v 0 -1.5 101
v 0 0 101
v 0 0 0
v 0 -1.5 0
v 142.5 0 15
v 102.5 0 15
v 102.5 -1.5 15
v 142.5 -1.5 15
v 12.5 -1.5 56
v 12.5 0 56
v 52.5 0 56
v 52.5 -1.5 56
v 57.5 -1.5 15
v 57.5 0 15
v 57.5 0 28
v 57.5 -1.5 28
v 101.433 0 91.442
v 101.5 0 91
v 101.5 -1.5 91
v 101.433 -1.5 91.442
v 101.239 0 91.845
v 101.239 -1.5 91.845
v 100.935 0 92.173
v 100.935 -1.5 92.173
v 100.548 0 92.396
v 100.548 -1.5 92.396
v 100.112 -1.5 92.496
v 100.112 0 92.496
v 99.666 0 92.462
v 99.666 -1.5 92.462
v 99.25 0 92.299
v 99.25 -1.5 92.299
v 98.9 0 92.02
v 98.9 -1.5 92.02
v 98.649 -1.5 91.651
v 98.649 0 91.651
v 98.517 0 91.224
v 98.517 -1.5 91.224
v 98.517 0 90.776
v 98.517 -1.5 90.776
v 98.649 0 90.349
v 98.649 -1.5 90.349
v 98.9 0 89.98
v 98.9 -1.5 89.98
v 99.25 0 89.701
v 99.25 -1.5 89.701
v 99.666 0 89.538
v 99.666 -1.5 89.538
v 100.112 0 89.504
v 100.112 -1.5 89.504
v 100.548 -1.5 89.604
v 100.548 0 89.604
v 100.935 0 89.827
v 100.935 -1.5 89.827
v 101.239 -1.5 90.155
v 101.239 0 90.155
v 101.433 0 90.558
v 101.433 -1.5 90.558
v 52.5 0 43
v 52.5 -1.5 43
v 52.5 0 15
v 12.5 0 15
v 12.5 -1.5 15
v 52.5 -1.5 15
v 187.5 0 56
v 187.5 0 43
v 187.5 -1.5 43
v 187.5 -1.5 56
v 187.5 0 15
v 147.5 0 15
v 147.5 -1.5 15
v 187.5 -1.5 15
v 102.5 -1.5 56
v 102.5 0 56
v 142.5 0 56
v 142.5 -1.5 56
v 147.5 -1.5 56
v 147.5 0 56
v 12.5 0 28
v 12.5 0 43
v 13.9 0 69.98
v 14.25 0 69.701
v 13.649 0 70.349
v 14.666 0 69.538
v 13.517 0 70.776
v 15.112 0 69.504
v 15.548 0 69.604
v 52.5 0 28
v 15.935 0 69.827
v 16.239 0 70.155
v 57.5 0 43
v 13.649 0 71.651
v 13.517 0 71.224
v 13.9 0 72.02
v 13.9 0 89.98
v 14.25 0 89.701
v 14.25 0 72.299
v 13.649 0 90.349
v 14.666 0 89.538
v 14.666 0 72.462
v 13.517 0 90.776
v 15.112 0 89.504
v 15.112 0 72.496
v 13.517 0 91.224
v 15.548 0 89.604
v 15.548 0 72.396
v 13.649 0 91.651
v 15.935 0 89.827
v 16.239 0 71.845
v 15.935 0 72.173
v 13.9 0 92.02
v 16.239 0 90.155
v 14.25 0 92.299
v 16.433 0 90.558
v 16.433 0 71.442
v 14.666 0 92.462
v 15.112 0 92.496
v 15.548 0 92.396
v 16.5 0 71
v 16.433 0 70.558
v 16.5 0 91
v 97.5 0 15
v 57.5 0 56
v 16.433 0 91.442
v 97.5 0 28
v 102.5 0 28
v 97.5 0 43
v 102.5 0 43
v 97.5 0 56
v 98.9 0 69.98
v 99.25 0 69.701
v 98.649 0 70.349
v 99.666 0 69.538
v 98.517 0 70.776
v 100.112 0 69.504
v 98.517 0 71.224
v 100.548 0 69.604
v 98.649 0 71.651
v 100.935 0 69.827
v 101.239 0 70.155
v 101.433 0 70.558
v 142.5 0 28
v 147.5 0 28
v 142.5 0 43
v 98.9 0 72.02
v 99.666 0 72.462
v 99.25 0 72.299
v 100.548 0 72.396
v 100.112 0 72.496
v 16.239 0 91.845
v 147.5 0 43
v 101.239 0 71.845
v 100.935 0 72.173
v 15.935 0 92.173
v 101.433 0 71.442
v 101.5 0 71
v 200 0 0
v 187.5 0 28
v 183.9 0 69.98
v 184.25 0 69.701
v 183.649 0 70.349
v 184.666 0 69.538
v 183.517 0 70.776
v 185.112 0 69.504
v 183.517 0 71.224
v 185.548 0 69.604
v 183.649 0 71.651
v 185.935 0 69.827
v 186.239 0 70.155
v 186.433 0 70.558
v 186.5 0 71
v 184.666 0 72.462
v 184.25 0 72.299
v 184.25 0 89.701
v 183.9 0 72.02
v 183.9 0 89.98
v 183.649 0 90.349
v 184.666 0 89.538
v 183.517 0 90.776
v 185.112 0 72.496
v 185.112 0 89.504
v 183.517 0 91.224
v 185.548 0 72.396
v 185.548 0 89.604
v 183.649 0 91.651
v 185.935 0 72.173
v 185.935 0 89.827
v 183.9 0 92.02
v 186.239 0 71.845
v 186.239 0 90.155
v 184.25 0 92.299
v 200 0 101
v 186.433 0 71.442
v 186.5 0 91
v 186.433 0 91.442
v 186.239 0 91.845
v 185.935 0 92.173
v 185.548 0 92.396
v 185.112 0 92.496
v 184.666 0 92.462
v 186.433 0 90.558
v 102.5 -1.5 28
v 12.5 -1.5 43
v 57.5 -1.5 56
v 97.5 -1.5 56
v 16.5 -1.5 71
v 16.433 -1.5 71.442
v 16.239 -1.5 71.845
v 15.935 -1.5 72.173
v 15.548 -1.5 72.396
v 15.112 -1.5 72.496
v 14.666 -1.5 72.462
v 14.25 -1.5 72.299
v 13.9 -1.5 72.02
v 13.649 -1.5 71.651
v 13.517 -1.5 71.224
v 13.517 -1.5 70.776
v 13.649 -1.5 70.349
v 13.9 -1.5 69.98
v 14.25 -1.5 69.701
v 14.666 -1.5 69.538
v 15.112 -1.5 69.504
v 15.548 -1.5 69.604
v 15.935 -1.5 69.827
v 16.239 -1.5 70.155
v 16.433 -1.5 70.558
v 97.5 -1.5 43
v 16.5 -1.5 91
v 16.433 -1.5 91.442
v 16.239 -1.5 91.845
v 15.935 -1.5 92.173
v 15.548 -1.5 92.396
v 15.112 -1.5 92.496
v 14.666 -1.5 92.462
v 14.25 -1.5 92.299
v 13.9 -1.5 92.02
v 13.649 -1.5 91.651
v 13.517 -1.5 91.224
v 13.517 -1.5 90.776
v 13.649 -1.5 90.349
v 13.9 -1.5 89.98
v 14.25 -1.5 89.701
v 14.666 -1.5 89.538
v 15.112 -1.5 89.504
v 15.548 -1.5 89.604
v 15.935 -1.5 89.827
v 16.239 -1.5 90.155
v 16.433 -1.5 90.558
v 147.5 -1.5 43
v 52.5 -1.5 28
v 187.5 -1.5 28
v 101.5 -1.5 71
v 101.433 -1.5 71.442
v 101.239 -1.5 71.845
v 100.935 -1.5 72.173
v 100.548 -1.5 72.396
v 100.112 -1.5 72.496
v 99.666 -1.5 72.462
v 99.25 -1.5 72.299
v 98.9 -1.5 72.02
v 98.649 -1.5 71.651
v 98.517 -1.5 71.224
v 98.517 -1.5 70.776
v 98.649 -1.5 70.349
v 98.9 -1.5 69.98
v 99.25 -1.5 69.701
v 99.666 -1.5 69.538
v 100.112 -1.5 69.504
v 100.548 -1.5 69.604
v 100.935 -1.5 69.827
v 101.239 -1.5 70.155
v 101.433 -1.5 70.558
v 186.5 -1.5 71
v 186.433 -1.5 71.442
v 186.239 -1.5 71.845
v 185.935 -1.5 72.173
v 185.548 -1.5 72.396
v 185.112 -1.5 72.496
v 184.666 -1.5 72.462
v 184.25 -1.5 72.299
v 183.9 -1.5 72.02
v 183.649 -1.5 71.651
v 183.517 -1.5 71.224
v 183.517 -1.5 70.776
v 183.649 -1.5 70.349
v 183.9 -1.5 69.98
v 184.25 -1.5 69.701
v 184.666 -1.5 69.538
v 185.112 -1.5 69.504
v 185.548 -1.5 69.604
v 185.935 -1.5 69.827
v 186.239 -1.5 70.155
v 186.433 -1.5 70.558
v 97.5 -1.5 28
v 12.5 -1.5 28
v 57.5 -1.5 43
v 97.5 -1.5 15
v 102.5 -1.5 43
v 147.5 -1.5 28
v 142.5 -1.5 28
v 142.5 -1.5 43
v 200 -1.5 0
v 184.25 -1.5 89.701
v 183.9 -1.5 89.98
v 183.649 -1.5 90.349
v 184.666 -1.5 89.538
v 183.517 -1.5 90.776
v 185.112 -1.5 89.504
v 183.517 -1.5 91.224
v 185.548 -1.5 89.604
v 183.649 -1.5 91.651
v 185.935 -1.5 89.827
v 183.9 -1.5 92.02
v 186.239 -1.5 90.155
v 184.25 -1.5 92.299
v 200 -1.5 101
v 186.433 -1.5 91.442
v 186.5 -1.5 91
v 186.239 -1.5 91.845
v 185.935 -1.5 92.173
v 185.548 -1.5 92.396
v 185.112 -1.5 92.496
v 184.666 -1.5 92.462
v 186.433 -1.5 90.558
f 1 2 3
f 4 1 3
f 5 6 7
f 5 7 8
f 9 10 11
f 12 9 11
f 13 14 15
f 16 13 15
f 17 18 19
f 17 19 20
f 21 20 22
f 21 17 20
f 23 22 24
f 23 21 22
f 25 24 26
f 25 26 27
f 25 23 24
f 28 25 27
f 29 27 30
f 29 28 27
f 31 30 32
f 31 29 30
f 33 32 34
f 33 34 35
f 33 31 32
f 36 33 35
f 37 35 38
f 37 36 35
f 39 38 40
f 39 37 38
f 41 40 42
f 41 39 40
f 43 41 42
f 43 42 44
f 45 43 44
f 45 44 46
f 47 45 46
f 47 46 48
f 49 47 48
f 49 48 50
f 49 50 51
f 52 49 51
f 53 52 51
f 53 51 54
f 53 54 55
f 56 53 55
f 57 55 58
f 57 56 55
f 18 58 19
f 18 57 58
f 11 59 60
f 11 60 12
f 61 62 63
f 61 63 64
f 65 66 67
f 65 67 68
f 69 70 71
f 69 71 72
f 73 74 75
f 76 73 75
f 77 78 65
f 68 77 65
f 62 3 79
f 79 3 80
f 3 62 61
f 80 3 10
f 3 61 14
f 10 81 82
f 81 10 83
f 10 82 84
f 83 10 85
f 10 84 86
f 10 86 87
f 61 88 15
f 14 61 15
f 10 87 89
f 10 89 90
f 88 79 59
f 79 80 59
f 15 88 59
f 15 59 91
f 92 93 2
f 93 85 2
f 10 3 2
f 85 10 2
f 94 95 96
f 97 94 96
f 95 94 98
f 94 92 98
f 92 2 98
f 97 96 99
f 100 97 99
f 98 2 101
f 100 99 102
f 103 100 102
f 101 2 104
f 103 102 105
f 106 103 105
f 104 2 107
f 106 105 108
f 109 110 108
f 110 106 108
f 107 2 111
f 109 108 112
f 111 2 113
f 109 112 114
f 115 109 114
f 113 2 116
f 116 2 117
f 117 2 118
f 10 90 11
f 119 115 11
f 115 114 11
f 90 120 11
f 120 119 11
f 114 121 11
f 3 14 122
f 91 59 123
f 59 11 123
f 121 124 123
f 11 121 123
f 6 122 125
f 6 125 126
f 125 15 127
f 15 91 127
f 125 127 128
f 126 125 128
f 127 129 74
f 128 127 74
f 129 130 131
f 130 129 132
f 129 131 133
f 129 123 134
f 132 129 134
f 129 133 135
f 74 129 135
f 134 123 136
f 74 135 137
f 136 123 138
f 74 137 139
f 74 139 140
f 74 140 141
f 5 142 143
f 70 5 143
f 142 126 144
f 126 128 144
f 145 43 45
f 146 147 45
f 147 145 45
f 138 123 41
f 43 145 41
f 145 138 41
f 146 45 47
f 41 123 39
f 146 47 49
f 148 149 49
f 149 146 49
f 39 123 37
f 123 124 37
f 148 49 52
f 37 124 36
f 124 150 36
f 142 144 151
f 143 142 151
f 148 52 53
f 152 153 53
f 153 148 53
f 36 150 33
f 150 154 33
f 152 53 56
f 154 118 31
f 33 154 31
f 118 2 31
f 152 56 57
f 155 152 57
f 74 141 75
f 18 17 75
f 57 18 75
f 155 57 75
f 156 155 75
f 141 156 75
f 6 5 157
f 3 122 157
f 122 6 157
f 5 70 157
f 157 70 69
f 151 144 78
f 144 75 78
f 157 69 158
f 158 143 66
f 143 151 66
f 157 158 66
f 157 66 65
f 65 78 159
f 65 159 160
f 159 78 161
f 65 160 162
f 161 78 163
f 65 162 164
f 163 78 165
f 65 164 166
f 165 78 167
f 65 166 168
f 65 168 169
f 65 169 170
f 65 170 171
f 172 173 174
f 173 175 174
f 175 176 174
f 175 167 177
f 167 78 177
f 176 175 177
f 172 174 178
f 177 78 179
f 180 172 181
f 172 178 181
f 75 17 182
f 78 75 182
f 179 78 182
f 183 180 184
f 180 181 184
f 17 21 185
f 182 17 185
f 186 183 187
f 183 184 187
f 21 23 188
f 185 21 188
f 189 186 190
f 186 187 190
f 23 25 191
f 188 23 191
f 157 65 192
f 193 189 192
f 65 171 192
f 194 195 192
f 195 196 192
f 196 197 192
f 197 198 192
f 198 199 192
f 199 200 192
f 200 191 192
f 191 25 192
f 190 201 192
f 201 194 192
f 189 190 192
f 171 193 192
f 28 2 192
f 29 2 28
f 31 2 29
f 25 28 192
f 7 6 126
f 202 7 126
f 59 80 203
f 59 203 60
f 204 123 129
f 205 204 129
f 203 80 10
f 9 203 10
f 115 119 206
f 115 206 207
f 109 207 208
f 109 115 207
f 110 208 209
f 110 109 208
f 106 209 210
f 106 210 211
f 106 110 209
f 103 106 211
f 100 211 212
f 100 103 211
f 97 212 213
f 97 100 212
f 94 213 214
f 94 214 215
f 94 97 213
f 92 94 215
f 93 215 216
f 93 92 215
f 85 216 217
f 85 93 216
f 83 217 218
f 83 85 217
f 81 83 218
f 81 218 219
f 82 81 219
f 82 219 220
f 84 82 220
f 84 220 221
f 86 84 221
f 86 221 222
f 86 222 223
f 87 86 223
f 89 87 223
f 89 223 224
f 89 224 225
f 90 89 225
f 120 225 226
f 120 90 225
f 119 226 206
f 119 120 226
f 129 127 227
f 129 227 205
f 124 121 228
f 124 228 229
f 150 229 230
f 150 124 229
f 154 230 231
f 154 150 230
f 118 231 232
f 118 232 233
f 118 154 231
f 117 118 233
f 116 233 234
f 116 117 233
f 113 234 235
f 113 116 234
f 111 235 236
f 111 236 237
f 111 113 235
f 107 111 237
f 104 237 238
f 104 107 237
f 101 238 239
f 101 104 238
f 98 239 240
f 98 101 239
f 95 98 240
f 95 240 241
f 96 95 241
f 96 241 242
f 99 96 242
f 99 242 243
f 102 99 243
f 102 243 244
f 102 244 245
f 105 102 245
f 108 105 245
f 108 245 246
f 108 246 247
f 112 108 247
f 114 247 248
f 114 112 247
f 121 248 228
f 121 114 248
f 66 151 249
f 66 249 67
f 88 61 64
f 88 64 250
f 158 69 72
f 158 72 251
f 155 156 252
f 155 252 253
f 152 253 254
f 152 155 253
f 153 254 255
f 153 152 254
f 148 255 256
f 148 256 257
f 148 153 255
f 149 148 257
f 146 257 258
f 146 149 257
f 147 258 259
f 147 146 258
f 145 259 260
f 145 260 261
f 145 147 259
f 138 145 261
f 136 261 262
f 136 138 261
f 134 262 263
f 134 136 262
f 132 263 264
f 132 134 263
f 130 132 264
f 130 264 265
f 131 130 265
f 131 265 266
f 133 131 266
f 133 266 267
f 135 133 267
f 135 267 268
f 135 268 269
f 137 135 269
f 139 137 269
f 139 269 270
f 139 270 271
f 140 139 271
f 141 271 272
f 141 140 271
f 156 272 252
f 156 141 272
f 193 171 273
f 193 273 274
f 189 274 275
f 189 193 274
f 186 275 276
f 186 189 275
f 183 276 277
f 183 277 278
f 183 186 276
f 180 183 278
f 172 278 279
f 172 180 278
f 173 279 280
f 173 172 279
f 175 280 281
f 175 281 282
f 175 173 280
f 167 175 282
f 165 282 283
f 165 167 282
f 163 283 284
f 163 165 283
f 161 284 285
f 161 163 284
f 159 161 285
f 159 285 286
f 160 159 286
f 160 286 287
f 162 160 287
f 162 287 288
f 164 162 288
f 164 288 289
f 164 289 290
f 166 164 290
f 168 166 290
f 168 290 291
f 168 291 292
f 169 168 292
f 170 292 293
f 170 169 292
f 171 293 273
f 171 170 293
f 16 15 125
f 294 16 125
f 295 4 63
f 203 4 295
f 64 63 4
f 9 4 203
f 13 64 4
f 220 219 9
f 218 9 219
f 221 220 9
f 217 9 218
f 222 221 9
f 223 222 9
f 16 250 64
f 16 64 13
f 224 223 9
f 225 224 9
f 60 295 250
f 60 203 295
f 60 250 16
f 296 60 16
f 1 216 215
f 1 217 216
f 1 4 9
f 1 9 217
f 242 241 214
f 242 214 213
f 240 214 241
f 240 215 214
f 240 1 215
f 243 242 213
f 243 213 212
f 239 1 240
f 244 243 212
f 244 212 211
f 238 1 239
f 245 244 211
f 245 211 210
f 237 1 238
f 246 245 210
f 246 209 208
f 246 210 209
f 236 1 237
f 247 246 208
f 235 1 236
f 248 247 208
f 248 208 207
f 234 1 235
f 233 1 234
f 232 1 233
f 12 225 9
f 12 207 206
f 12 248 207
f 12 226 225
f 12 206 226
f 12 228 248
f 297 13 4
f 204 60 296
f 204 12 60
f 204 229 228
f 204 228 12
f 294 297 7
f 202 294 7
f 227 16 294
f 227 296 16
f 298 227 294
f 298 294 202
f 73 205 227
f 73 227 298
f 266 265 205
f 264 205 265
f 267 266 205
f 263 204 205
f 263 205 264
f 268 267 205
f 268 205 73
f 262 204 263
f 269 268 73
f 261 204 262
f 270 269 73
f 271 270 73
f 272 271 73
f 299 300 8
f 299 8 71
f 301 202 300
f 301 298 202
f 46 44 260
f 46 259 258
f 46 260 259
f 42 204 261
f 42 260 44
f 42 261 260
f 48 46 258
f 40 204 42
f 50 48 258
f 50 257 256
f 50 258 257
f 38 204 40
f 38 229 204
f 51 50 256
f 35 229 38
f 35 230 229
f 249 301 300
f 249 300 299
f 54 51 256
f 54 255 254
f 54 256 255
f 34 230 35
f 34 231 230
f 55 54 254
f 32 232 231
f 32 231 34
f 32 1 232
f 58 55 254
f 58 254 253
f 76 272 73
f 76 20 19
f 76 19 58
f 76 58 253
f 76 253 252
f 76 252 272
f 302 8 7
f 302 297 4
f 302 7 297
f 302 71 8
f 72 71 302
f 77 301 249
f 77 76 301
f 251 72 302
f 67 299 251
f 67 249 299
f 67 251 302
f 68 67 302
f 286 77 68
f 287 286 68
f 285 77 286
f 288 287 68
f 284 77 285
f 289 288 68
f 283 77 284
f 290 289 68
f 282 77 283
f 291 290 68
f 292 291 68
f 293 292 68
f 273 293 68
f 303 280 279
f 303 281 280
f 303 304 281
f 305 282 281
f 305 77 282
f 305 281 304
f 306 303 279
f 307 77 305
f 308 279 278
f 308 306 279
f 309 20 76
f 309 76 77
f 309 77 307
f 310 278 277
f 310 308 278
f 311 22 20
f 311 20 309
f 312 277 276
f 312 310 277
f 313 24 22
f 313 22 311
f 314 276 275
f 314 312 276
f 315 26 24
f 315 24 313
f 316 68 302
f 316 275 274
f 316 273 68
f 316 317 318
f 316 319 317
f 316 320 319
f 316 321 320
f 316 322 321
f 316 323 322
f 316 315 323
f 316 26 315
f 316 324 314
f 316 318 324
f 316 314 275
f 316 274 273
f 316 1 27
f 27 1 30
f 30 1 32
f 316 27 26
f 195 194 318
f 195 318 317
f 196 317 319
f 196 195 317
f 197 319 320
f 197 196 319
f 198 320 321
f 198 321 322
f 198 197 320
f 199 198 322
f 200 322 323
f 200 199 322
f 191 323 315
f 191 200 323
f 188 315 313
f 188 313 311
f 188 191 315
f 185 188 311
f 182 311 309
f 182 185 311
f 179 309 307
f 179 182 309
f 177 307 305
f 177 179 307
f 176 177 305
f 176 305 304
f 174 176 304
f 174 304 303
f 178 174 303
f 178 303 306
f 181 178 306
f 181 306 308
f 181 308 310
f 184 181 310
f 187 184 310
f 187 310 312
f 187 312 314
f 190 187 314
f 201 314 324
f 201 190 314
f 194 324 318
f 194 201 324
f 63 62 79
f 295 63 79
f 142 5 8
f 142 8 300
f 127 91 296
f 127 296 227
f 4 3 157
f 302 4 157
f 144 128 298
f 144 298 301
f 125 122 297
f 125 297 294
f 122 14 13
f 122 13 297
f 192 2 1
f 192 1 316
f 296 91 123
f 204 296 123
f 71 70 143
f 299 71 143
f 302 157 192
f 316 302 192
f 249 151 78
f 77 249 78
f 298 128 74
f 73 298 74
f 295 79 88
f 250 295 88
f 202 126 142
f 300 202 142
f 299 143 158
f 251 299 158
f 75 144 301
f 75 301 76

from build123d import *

# Parameters (mm, degrees)
F0_W     = 200
F0_H     = 61
F0_W_2   = 40
F0_H_2   = 13
F0_H_3   = 40
F0_R     = 1.5
F1_DEPTH = 1.5


with BuildPart() as f1:
    # F0 (on Front) → F1 (new body)
    with BuildSketch(Plane.XZ):
        with Locations((100, 30.5)):
            Rectangle(F0_W, F0_H)
        with Locations((32.5, 21.5)):
            Rectangle(F0_W_2, F0_H_2, mode=Mode.SUBTRACT)
        with Locations((77.5, 21.5)):
            Rectangle(F0_W_2, F0_H_2, mode=Mode.SUBTRACT)
        with Locations((32.5, 49.5)):
            Rectangle(F0_W_2, F0_H_2, mode=Mode.SUBTRACT)
        with Locations((77.5, 49.5)):
            Rectangle(F0_W_2, F0_H_2, mode=Mode.SUBTRACT)
        with Locations((122.5, 21.5)):
            Rectangle(F0_W_2, F0_H_2, mode=Mode.SUBTRACT)
        with Locations((167.5, 21.5)):
            Rectangle(F0_W_2, F0_H_2, mode=Mode.SUBTRACT)
        with Locations((122.5, 49.5)):
            Rectangle(F0_W_2, F0_H_2, mode=Mode.SUBTRACT)
        with Locations((167.5, 49.5)):
            Rectangle(F0_W_2, F0_H_2, mode=Mode.SUBTRACT)
        with Locations((100, 81)):
            Rectangle(F0_W, F0_H_3)
        with Locations((15, 71)):
            Circle(F0_R, mode=Mode.SUBTRACT)
        with Locations((15, 91)):
            Circle(F0_R, mode=Mode.SUBTRACT)
        with Locations((100, 71)):
            Circle(F0_R, mode=Mode.SUBTRACT)
        with Locations((185, 71)):
            Circle(F0_R, mode=Mode.SUBTRACT)
        with Locations((100, 91)):
            Circle(F0_R, mode=Mode.SUBTRACT)
        with Locations((185, 91)):
            Circle(F0_R, mode=Mode.SUBTRACT)
    extrude(amount=F1_DEPTH)


solid = f1.part
